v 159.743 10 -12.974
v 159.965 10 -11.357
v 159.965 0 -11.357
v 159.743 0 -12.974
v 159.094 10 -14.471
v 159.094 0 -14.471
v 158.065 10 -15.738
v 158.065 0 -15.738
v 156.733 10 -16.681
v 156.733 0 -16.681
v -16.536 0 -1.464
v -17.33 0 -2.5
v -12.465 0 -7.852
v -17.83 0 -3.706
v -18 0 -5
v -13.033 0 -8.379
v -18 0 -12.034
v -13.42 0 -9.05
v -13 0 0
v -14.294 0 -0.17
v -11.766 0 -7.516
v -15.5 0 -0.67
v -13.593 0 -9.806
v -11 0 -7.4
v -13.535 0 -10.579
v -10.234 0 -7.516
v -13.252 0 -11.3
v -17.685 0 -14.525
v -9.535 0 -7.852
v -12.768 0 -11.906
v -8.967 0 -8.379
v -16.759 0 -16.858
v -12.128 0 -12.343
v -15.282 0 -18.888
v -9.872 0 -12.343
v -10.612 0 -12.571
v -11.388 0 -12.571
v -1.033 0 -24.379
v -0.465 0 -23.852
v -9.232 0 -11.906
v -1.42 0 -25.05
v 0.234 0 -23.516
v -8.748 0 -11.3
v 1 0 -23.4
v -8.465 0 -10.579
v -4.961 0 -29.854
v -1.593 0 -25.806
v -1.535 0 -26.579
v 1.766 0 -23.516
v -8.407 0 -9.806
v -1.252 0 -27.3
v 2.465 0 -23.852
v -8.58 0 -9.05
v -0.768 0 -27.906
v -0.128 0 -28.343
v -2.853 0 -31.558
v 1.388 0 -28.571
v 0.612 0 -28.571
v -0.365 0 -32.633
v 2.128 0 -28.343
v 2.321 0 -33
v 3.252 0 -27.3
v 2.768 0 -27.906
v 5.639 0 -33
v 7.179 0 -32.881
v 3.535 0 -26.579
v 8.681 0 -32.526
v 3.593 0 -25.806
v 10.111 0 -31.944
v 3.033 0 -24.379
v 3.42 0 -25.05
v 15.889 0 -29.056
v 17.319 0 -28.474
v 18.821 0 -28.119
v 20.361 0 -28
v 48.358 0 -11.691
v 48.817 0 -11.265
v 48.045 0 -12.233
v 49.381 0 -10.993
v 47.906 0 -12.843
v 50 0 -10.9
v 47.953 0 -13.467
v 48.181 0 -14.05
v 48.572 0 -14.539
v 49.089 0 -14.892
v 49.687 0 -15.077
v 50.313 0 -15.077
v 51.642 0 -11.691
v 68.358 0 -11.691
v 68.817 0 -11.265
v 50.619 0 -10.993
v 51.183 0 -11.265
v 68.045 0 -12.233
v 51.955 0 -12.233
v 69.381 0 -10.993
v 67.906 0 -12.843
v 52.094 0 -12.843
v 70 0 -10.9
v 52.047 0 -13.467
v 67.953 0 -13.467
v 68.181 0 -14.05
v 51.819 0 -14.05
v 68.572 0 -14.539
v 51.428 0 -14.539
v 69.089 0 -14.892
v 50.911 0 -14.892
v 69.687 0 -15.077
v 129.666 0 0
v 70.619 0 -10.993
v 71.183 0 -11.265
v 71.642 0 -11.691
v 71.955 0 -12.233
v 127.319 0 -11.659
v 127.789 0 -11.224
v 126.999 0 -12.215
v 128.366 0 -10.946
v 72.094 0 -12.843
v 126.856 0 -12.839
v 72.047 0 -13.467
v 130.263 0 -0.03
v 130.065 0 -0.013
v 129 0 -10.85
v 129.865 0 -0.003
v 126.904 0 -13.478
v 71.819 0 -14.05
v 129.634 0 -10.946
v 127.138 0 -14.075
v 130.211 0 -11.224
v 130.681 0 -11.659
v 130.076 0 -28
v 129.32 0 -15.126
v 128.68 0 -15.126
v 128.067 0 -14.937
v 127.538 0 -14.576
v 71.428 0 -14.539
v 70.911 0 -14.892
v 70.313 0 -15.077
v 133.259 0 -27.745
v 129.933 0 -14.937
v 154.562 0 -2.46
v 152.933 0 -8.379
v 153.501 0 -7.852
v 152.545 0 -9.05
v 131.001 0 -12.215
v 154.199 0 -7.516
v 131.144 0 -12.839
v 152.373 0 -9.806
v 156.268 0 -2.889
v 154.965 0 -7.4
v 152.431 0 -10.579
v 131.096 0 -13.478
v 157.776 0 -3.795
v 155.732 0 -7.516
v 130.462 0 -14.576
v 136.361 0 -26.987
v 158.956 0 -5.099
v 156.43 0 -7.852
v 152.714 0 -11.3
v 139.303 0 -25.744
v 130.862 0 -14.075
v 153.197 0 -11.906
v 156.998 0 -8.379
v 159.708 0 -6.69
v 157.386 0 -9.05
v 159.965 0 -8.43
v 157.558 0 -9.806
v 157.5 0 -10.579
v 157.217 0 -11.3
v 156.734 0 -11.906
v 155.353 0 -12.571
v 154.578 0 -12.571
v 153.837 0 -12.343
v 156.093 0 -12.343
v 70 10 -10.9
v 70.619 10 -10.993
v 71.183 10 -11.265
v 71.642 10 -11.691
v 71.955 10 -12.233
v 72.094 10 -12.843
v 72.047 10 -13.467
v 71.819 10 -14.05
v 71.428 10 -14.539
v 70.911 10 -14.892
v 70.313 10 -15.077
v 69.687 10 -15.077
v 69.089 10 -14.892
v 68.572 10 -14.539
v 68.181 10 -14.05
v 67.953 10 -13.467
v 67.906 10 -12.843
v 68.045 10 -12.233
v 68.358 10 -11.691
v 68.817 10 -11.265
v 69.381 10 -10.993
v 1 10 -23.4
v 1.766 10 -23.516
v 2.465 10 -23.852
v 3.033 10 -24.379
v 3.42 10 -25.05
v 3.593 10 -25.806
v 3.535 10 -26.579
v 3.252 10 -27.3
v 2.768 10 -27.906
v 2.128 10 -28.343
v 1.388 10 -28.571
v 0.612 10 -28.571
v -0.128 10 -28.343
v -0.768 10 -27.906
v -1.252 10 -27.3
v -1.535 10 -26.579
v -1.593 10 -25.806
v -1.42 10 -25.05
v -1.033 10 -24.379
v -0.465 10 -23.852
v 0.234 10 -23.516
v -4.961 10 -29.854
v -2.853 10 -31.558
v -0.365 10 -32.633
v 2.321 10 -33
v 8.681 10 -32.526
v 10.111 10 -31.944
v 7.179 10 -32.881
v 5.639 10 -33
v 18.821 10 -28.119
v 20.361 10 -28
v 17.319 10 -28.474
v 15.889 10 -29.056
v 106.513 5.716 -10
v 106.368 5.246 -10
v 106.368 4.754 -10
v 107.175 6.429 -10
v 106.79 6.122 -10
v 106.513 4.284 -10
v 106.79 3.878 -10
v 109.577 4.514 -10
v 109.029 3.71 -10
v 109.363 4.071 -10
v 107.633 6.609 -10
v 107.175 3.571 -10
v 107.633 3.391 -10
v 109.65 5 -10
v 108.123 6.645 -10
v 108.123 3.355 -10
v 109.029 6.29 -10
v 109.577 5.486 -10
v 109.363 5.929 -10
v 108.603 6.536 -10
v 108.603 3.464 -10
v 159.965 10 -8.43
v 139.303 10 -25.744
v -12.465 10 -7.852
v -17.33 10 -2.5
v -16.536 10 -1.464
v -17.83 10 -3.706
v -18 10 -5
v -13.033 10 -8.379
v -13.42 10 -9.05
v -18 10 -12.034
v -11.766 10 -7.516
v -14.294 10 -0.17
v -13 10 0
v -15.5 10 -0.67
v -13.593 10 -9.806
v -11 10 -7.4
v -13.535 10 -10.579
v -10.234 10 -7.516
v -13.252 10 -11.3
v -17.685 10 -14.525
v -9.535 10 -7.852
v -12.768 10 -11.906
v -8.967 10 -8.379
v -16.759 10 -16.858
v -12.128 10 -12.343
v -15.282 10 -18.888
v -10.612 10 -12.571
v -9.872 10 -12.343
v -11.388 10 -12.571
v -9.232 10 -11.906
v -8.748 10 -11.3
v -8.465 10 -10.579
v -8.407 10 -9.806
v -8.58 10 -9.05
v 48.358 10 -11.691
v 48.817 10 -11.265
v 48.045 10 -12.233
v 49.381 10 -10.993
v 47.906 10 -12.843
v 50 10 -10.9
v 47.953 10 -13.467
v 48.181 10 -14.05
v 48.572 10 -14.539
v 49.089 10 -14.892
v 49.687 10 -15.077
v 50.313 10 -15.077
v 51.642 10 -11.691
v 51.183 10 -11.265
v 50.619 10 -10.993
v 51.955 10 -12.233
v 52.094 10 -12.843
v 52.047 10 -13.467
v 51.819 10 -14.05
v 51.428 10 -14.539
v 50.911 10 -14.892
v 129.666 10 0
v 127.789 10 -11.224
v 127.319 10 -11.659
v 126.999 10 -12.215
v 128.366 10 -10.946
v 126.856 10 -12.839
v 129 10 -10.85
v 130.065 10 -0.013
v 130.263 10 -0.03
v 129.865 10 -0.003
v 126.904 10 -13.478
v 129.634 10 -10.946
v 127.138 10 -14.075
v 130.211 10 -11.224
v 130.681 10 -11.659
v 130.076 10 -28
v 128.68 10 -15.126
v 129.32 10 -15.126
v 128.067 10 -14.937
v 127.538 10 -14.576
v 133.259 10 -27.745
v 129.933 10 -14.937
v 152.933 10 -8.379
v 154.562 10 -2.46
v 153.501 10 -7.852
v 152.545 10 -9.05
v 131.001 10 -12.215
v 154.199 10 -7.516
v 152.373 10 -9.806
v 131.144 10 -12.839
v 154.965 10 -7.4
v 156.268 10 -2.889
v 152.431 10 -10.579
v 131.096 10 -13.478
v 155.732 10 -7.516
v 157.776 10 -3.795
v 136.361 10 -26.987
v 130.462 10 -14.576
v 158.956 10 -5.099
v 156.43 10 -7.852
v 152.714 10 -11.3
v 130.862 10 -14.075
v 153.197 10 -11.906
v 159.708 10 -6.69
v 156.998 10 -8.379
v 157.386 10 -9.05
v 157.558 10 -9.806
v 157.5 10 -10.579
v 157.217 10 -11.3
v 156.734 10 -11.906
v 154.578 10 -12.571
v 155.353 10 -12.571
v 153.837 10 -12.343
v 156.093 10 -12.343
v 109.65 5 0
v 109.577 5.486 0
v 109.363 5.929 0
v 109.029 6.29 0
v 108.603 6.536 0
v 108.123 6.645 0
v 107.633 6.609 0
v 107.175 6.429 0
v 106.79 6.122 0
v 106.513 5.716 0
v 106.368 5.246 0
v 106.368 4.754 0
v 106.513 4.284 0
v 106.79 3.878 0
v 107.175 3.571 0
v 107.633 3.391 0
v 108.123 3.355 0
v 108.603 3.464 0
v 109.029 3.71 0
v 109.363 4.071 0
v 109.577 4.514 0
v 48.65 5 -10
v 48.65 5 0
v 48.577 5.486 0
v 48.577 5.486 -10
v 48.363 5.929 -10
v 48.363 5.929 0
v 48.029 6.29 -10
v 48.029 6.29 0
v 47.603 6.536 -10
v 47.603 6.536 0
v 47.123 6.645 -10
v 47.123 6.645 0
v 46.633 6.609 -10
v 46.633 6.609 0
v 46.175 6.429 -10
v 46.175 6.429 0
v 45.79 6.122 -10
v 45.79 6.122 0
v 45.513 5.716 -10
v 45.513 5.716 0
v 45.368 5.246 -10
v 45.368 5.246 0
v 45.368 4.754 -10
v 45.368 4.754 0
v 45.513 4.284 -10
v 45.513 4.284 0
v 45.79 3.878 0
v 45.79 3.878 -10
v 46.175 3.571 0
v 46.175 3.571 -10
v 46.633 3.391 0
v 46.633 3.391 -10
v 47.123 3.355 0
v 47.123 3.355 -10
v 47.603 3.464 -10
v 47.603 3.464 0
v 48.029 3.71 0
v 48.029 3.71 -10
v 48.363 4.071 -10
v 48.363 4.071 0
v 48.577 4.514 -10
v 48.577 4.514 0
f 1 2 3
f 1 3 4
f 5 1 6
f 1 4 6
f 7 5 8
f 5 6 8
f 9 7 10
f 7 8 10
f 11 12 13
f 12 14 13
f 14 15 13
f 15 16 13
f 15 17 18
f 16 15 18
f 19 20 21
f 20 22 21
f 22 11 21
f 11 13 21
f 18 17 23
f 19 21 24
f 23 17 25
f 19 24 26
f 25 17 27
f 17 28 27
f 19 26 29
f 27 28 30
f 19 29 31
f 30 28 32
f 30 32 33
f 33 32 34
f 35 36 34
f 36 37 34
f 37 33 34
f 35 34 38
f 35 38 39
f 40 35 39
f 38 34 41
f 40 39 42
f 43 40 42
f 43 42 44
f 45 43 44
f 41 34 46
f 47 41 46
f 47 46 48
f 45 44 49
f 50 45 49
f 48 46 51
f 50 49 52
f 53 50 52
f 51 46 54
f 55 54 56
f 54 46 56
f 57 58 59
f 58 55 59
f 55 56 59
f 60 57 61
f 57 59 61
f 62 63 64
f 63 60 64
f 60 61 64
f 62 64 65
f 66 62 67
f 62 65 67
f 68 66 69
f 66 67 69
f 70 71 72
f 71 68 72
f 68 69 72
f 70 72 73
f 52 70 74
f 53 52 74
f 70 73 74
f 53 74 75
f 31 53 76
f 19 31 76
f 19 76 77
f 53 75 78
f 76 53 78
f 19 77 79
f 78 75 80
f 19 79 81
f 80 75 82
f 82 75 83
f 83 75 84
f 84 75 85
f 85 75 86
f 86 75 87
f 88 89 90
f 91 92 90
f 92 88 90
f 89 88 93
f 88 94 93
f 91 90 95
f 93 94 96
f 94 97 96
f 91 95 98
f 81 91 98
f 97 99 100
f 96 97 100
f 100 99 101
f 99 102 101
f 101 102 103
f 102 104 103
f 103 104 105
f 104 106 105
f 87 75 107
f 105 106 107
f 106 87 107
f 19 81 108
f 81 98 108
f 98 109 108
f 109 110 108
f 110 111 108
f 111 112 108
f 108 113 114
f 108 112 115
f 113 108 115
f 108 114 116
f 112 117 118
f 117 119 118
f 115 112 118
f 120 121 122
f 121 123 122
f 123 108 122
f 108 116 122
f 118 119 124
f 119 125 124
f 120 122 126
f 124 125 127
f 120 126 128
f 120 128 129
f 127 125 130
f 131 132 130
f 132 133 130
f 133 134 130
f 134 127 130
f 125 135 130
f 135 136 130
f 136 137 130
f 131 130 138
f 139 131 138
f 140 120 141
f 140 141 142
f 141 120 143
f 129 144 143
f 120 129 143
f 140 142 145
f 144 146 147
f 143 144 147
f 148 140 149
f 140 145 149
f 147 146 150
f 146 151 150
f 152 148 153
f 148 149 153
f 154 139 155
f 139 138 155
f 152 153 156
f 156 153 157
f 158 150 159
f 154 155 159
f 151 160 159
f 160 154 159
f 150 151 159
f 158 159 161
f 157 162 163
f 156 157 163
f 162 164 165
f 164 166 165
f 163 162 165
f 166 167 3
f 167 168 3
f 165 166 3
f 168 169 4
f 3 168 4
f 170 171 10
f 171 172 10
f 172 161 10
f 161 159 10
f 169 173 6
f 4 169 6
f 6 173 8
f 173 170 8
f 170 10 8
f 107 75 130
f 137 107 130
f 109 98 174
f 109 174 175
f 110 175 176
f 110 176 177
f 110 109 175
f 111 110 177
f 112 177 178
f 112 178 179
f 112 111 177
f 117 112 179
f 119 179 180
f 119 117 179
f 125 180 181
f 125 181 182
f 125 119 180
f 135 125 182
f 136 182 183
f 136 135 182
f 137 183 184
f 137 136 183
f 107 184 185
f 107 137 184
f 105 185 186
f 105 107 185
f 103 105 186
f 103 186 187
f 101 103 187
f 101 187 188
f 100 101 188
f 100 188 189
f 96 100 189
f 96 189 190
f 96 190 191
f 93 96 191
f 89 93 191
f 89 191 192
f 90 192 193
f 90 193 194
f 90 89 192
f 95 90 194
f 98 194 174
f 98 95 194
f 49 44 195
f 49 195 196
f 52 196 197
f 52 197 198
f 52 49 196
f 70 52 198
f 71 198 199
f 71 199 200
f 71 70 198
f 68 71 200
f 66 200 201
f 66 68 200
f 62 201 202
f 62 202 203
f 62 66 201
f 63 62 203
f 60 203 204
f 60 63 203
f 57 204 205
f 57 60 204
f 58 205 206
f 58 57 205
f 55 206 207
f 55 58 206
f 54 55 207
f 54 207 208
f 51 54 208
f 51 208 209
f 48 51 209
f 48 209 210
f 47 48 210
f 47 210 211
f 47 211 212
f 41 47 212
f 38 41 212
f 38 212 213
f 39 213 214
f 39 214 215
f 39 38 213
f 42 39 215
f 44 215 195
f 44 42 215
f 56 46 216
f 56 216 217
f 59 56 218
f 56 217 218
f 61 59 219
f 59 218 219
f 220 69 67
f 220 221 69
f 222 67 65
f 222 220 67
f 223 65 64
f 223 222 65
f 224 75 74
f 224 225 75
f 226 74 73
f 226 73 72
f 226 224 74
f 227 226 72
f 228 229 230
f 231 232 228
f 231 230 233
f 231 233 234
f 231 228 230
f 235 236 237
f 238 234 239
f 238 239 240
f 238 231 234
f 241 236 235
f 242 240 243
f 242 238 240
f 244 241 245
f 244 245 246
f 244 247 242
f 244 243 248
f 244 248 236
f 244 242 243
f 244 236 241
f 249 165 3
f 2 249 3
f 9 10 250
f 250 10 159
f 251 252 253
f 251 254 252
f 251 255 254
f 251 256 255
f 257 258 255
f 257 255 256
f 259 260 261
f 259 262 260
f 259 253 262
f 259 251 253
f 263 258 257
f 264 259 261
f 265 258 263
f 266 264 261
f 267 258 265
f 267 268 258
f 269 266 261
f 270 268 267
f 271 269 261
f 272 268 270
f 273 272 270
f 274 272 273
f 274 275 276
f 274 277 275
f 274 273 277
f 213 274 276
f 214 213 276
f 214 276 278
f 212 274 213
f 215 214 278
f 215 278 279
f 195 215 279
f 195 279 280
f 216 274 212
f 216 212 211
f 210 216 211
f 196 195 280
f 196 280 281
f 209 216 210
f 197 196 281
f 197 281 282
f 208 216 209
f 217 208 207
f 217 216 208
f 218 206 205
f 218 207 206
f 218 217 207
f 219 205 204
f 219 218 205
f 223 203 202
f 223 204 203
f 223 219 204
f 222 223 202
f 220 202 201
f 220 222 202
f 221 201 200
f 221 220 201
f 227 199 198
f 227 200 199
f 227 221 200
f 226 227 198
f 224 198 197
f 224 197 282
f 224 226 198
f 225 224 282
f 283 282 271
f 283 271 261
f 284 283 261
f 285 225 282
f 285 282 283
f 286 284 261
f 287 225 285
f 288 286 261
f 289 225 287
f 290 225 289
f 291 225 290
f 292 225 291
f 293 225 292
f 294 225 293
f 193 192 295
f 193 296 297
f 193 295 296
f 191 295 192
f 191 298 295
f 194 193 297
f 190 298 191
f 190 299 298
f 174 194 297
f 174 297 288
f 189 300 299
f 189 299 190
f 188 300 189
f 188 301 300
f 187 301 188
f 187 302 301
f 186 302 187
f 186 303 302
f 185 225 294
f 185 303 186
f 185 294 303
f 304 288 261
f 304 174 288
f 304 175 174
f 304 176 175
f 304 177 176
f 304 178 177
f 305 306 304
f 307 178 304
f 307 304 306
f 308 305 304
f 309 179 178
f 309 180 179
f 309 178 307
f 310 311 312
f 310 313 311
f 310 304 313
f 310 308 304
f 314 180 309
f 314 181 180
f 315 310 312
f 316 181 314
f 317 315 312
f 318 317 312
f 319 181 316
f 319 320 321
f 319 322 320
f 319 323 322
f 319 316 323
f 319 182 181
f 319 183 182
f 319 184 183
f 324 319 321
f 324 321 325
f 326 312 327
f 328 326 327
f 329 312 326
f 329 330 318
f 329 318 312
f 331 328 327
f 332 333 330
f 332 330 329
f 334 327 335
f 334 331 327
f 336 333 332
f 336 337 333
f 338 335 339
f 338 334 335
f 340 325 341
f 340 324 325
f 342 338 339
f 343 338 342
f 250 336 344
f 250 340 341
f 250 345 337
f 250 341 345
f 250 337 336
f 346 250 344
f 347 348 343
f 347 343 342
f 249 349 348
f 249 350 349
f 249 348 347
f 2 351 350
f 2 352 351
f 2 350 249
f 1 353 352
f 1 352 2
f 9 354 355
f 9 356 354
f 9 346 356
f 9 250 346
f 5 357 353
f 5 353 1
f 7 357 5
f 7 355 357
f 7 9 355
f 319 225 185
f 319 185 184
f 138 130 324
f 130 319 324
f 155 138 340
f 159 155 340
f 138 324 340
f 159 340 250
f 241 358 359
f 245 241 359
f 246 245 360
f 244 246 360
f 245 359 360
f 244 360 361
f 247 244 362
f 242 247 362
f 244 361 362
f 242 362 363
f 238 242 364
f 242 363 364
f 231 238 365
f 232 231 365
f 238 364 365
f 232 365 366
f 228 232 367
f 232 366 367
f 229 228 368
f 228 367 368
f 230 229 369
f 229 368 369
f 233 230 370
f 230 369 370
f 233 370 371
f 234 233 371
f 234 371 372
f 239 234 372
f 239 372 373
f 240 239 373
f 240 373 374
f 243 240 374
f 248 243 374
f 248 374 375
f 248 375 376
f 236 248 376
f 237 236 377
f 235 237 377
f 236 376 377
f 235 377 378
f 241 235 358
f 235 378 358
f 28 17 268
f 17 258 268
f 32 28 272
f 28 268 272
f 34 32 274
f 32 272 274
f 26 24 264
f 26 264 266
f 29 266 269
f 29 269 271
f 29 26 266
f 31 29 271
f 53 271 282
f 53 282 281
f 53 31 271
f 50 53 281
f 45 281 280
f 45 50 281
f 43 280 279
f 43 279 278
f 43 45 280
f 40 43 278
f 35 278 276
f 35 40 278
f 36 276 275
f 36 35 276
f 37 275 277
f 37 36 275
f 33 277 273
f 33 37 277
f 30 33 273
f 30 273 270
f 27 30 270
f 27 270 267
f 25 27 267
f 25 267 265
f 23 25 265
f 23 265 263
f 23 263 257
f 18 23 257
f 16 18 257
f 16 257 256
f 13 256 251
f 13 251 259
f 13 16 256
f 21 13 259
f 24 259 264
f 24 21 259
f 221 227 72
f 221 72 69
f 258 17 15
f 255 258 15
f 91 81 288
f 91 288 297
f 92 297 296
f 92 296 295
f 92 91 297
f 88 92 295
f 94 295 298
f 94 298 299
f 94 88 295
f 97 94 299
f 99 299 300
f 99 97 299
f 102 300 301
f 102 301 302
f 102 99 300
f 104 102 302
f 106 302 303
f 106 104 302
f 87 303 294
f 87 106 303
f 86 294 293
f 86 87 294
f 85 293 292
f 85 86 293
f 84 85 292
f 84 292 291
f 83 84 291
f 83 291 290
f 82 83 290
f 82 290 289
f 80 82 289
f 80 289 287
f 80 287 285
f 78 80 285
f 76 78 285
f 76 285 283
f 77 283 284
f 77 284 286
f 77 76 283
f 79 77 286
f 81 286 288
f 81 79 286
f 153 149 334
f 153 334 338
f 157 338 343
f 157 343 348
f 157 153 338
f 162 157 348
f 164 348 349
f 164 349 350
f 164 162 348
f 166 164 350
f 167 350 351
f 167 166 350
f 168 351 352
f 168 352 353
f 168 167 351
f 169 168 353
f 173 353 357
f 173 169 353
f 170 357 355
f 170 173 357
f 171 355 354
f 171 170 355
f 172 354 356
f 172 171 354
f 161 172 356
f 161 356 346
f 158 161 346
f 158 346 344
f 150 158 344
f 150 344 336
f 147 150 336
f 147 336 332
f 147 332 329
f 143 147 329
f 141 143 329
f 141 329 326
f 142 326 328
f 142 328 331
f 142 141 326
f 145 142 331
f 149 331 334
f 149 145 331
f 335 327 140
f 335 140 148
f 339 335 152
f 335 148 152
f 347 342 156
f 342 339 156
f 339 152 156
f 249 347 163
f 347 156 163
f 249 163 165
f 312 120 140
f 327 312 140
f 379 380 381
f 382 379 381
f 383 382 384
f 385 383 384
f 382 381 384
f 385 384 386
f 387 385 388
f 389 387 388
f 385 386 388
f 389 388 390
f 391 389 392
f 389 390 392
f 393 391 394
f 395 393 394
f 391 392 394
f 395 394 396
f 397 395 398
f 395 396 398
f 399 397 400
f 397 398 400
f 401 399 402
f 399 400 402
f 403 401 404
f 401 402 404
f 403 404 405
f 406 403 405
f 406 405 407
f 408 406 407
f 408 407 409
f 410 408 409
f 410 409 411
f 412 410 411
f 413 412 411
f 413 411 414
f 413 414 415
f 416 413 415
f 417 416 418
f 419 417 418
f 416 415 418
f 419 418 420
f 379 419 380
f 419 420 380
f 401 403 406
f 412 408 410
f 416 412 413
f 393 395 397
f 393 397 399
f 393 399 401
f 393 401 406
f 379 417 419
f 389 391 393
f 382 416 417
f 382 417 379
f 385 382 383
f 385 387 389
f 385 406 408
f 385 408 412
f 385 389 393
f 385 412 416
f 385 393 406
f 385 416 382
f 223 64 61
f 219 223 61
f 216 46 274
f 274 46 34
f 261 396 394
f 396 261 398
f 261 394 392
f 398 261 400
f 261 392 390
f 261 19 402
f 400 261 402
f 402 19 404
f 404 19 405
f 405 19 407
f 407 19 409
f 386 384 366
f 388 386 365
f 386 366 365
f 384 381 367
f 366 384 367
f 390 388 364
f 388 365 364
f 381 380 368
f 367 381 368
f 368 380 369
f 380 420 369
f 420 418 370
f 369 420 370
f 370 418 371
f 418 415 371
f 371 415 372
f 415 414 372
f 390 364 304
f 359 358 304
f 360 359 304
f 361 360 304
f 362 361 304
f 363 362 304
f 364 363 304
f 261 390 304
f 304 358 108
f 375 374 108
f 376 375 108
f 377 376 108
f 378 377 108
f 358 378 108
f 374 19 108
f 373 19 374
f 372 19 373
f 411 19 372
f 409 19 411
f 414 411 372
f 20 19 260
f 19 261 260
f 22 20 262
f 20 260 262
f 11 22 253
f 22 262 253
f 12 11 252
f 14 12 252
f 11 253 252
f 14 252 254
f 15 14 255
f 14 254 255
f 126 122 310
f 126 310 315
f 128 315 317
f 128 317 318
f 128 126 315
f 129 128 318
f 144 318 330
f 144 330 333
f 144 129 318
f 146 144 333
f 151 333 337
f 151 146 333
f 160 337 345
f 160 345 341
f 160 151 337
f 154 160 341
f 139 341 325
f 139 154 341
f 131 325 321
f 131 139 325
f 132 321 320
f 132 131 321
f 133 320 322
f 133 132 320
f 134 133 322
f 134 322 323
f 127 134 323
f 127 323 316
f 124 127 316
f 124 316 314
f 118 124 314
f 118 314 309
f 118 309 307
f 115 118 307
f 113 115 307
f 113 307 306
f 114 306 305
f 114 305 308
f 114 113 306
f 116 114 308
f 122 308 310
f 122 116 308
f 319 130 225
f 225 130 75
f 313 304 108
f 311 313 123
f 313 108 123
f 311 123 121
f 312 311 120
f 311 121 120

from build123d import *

# Parameters (mm, degrees)
SKETCH1_R           = 2.6
SKETCH1_R_2         = 2.15
SKETCH1_R_3         = 2.1
BOSS_EXTRUDE1_DEPTH = 10
FILLET1_R           = 5
FILLET2_R           = 6
FILLET3_R           = 10
FILLET4_R           = 20
FILLET5_R           = 10
SKETCH2_R           = 1.65
CUT_EXTRUDE1_DEPTH  = 10


with BuildPart() as part:
    # Sketch1 → Boss-Extrude1 (new body)
    with BuildSketch(Plane(origin=(0, 0, 0), x_dir=(1, 0, 0), z_dir=(0, 1, 0))):
        Polygon((159.965380006, 15), (134.965380006, 28), (18, 28), (8, 33), (-2, 33), (-18, 16), (-18, 0), (0, 0), (129.965380006, 0), (159.965380006, 3), align=None)
        with Locations(Location((-11, 10, 0), (0, 0, 270))):
            Circle(SKETCH1_R, mode=Mode.SUBTRACT)
        with Locations(Location((129, 13, 0), (0, 0, 270))):
            Circle(SKETCH1_R_2, mode=Mode.SUBTRACT)
        with Locations(Location((154.965380006, 10, 0), (0, 0, 270))):
            Circle(SKETCH1_R, mode=Mode.SUBTRACT)
        with Locations(Location((1, 26, 0), (0, 0, 270))):
            Circle(SKETCH1_R, mode=Mode.SUBTRACT)
        with Locations(Location((50, 13, 0), (0, 0, 270))):
            Circle(SKETCH1_R_3, mode=Mode.SUBTRACT)
        with Locations(Location((70, 13, 0), (0, 0, 270))):
            Circle(SKETCH1_R_3, mode=Mode.SUBTRACT)
    extrude(amount=BOSS_EXTRUDE1_DEPTH)

    # Fillet1
    fillet1_edges = [part.edges().sort_by_distance(p)[0] for p in [
        (-18, 5, 0),
    ]]
    fillet(fillet1_edges, radius=FILLET1_R)

    # Fillet2
    # the kernel refuses this fillet: 6 mm, written as the material it takes off along each edge
    with BuildSketch(Plane(origin=(159.965380006, -9.106803364, -15), x_dir=(0, 0, 1), z_dir=(0, 1, 0))) as fillet2_piece_1:
        with BuildLine():
            CenterArc((FILLET2_R * 0.607120224288, -FILLET2_R), FILLET2_R, 90, 62.525568374)
            Line((-FILLET2_R * 0.280096576946, -FILLET2_R * 0.538647263358), (0, 0))
            Line((0, 0), (FILLET2_R * 0.607120224288, 0))
        make_face()
    extrude(amount=28.213606729, mode=Mode.SUBTRACT)
    with BuildSketch(Plane(origin=(159.965380006, -13.574813432, -3), x_dir=(-0.9950371902099892, 0, 0.0995037190209987), z_dir=(0, 1, 0))) as fillet2_piece_2:
        with BuildLine():
            CenterArc((FILLET2_R * 0.904987562112, -FILLET2_R), FILLET2_R, 90, 84.289406863)
            Line((-FILLET2_R * 0.0900496280979, -FILLET2_R * 0.900496280979), (0, 0))
            Line((0, 0), (FILLET2_R * 0.904987562112, 0))
        make_face()
    extrude(amount=37.149626863, mode=Mode.SUBTRACT)
    with BuildSketch(Plane(origin=(129.965380006, -0.748134317, 0), x_dir=(-1, 0, 0), z_dir=(0, 1, 0))) as fillet2_piece_3:
        with BuildLine():
            CenterArc((FILLET2_R * 0.0498756211209, -FILLET2_R), FILLET2_R, 90, 5.710593137)
            Line((-FILLET2_R * 0.0496280979001, -FILLET2_R * 0.00496280979001), (0, 0))
            Line((0, 0), (FILLET2_R * 0.0498756211209, 0))
        make_face()
    extrude(amount=11.496268634, mode=Mode.SUBTRACT)

    # Fillet3
    fillet3_edges = [part.edges().sort_by_distance(p)[0] for p in [
        (-18, 5, -16),
        (-2, 5, -33),
    ]]
    fillet(fillet3_edges, radius=FILLET3_R)

    # Fillet4
    fillet4_edges = [part.edges().sort_by_distance(p)[0] for p in [
        (134.965380006, 5, -28),
    ]]
    fillet(fillet4_edges, radius=FILLET4_R)

    # Fillet5
    fillet5_edges = [part.edges().sort_by_distance(p)[0] for p in [
        (8, 5, -33),
        (18, 5, -28),
    ]]
    fillet(fillet5_edges, radius=FILLET5_R)

    # Sketch2 → Cut-Extrude1 (cut)
    with BuildSketch(Plane.XY):
        with Locations((47, 5)):
            Circle(SKETCH2_R)
        with Locations((108, 5)):
            Circle(SKETCH2_R)
    extrude(amount=-CUT_EXTRUDE1_DEPTH, mode=Mode.SUBTRACT)


solid = part.part
